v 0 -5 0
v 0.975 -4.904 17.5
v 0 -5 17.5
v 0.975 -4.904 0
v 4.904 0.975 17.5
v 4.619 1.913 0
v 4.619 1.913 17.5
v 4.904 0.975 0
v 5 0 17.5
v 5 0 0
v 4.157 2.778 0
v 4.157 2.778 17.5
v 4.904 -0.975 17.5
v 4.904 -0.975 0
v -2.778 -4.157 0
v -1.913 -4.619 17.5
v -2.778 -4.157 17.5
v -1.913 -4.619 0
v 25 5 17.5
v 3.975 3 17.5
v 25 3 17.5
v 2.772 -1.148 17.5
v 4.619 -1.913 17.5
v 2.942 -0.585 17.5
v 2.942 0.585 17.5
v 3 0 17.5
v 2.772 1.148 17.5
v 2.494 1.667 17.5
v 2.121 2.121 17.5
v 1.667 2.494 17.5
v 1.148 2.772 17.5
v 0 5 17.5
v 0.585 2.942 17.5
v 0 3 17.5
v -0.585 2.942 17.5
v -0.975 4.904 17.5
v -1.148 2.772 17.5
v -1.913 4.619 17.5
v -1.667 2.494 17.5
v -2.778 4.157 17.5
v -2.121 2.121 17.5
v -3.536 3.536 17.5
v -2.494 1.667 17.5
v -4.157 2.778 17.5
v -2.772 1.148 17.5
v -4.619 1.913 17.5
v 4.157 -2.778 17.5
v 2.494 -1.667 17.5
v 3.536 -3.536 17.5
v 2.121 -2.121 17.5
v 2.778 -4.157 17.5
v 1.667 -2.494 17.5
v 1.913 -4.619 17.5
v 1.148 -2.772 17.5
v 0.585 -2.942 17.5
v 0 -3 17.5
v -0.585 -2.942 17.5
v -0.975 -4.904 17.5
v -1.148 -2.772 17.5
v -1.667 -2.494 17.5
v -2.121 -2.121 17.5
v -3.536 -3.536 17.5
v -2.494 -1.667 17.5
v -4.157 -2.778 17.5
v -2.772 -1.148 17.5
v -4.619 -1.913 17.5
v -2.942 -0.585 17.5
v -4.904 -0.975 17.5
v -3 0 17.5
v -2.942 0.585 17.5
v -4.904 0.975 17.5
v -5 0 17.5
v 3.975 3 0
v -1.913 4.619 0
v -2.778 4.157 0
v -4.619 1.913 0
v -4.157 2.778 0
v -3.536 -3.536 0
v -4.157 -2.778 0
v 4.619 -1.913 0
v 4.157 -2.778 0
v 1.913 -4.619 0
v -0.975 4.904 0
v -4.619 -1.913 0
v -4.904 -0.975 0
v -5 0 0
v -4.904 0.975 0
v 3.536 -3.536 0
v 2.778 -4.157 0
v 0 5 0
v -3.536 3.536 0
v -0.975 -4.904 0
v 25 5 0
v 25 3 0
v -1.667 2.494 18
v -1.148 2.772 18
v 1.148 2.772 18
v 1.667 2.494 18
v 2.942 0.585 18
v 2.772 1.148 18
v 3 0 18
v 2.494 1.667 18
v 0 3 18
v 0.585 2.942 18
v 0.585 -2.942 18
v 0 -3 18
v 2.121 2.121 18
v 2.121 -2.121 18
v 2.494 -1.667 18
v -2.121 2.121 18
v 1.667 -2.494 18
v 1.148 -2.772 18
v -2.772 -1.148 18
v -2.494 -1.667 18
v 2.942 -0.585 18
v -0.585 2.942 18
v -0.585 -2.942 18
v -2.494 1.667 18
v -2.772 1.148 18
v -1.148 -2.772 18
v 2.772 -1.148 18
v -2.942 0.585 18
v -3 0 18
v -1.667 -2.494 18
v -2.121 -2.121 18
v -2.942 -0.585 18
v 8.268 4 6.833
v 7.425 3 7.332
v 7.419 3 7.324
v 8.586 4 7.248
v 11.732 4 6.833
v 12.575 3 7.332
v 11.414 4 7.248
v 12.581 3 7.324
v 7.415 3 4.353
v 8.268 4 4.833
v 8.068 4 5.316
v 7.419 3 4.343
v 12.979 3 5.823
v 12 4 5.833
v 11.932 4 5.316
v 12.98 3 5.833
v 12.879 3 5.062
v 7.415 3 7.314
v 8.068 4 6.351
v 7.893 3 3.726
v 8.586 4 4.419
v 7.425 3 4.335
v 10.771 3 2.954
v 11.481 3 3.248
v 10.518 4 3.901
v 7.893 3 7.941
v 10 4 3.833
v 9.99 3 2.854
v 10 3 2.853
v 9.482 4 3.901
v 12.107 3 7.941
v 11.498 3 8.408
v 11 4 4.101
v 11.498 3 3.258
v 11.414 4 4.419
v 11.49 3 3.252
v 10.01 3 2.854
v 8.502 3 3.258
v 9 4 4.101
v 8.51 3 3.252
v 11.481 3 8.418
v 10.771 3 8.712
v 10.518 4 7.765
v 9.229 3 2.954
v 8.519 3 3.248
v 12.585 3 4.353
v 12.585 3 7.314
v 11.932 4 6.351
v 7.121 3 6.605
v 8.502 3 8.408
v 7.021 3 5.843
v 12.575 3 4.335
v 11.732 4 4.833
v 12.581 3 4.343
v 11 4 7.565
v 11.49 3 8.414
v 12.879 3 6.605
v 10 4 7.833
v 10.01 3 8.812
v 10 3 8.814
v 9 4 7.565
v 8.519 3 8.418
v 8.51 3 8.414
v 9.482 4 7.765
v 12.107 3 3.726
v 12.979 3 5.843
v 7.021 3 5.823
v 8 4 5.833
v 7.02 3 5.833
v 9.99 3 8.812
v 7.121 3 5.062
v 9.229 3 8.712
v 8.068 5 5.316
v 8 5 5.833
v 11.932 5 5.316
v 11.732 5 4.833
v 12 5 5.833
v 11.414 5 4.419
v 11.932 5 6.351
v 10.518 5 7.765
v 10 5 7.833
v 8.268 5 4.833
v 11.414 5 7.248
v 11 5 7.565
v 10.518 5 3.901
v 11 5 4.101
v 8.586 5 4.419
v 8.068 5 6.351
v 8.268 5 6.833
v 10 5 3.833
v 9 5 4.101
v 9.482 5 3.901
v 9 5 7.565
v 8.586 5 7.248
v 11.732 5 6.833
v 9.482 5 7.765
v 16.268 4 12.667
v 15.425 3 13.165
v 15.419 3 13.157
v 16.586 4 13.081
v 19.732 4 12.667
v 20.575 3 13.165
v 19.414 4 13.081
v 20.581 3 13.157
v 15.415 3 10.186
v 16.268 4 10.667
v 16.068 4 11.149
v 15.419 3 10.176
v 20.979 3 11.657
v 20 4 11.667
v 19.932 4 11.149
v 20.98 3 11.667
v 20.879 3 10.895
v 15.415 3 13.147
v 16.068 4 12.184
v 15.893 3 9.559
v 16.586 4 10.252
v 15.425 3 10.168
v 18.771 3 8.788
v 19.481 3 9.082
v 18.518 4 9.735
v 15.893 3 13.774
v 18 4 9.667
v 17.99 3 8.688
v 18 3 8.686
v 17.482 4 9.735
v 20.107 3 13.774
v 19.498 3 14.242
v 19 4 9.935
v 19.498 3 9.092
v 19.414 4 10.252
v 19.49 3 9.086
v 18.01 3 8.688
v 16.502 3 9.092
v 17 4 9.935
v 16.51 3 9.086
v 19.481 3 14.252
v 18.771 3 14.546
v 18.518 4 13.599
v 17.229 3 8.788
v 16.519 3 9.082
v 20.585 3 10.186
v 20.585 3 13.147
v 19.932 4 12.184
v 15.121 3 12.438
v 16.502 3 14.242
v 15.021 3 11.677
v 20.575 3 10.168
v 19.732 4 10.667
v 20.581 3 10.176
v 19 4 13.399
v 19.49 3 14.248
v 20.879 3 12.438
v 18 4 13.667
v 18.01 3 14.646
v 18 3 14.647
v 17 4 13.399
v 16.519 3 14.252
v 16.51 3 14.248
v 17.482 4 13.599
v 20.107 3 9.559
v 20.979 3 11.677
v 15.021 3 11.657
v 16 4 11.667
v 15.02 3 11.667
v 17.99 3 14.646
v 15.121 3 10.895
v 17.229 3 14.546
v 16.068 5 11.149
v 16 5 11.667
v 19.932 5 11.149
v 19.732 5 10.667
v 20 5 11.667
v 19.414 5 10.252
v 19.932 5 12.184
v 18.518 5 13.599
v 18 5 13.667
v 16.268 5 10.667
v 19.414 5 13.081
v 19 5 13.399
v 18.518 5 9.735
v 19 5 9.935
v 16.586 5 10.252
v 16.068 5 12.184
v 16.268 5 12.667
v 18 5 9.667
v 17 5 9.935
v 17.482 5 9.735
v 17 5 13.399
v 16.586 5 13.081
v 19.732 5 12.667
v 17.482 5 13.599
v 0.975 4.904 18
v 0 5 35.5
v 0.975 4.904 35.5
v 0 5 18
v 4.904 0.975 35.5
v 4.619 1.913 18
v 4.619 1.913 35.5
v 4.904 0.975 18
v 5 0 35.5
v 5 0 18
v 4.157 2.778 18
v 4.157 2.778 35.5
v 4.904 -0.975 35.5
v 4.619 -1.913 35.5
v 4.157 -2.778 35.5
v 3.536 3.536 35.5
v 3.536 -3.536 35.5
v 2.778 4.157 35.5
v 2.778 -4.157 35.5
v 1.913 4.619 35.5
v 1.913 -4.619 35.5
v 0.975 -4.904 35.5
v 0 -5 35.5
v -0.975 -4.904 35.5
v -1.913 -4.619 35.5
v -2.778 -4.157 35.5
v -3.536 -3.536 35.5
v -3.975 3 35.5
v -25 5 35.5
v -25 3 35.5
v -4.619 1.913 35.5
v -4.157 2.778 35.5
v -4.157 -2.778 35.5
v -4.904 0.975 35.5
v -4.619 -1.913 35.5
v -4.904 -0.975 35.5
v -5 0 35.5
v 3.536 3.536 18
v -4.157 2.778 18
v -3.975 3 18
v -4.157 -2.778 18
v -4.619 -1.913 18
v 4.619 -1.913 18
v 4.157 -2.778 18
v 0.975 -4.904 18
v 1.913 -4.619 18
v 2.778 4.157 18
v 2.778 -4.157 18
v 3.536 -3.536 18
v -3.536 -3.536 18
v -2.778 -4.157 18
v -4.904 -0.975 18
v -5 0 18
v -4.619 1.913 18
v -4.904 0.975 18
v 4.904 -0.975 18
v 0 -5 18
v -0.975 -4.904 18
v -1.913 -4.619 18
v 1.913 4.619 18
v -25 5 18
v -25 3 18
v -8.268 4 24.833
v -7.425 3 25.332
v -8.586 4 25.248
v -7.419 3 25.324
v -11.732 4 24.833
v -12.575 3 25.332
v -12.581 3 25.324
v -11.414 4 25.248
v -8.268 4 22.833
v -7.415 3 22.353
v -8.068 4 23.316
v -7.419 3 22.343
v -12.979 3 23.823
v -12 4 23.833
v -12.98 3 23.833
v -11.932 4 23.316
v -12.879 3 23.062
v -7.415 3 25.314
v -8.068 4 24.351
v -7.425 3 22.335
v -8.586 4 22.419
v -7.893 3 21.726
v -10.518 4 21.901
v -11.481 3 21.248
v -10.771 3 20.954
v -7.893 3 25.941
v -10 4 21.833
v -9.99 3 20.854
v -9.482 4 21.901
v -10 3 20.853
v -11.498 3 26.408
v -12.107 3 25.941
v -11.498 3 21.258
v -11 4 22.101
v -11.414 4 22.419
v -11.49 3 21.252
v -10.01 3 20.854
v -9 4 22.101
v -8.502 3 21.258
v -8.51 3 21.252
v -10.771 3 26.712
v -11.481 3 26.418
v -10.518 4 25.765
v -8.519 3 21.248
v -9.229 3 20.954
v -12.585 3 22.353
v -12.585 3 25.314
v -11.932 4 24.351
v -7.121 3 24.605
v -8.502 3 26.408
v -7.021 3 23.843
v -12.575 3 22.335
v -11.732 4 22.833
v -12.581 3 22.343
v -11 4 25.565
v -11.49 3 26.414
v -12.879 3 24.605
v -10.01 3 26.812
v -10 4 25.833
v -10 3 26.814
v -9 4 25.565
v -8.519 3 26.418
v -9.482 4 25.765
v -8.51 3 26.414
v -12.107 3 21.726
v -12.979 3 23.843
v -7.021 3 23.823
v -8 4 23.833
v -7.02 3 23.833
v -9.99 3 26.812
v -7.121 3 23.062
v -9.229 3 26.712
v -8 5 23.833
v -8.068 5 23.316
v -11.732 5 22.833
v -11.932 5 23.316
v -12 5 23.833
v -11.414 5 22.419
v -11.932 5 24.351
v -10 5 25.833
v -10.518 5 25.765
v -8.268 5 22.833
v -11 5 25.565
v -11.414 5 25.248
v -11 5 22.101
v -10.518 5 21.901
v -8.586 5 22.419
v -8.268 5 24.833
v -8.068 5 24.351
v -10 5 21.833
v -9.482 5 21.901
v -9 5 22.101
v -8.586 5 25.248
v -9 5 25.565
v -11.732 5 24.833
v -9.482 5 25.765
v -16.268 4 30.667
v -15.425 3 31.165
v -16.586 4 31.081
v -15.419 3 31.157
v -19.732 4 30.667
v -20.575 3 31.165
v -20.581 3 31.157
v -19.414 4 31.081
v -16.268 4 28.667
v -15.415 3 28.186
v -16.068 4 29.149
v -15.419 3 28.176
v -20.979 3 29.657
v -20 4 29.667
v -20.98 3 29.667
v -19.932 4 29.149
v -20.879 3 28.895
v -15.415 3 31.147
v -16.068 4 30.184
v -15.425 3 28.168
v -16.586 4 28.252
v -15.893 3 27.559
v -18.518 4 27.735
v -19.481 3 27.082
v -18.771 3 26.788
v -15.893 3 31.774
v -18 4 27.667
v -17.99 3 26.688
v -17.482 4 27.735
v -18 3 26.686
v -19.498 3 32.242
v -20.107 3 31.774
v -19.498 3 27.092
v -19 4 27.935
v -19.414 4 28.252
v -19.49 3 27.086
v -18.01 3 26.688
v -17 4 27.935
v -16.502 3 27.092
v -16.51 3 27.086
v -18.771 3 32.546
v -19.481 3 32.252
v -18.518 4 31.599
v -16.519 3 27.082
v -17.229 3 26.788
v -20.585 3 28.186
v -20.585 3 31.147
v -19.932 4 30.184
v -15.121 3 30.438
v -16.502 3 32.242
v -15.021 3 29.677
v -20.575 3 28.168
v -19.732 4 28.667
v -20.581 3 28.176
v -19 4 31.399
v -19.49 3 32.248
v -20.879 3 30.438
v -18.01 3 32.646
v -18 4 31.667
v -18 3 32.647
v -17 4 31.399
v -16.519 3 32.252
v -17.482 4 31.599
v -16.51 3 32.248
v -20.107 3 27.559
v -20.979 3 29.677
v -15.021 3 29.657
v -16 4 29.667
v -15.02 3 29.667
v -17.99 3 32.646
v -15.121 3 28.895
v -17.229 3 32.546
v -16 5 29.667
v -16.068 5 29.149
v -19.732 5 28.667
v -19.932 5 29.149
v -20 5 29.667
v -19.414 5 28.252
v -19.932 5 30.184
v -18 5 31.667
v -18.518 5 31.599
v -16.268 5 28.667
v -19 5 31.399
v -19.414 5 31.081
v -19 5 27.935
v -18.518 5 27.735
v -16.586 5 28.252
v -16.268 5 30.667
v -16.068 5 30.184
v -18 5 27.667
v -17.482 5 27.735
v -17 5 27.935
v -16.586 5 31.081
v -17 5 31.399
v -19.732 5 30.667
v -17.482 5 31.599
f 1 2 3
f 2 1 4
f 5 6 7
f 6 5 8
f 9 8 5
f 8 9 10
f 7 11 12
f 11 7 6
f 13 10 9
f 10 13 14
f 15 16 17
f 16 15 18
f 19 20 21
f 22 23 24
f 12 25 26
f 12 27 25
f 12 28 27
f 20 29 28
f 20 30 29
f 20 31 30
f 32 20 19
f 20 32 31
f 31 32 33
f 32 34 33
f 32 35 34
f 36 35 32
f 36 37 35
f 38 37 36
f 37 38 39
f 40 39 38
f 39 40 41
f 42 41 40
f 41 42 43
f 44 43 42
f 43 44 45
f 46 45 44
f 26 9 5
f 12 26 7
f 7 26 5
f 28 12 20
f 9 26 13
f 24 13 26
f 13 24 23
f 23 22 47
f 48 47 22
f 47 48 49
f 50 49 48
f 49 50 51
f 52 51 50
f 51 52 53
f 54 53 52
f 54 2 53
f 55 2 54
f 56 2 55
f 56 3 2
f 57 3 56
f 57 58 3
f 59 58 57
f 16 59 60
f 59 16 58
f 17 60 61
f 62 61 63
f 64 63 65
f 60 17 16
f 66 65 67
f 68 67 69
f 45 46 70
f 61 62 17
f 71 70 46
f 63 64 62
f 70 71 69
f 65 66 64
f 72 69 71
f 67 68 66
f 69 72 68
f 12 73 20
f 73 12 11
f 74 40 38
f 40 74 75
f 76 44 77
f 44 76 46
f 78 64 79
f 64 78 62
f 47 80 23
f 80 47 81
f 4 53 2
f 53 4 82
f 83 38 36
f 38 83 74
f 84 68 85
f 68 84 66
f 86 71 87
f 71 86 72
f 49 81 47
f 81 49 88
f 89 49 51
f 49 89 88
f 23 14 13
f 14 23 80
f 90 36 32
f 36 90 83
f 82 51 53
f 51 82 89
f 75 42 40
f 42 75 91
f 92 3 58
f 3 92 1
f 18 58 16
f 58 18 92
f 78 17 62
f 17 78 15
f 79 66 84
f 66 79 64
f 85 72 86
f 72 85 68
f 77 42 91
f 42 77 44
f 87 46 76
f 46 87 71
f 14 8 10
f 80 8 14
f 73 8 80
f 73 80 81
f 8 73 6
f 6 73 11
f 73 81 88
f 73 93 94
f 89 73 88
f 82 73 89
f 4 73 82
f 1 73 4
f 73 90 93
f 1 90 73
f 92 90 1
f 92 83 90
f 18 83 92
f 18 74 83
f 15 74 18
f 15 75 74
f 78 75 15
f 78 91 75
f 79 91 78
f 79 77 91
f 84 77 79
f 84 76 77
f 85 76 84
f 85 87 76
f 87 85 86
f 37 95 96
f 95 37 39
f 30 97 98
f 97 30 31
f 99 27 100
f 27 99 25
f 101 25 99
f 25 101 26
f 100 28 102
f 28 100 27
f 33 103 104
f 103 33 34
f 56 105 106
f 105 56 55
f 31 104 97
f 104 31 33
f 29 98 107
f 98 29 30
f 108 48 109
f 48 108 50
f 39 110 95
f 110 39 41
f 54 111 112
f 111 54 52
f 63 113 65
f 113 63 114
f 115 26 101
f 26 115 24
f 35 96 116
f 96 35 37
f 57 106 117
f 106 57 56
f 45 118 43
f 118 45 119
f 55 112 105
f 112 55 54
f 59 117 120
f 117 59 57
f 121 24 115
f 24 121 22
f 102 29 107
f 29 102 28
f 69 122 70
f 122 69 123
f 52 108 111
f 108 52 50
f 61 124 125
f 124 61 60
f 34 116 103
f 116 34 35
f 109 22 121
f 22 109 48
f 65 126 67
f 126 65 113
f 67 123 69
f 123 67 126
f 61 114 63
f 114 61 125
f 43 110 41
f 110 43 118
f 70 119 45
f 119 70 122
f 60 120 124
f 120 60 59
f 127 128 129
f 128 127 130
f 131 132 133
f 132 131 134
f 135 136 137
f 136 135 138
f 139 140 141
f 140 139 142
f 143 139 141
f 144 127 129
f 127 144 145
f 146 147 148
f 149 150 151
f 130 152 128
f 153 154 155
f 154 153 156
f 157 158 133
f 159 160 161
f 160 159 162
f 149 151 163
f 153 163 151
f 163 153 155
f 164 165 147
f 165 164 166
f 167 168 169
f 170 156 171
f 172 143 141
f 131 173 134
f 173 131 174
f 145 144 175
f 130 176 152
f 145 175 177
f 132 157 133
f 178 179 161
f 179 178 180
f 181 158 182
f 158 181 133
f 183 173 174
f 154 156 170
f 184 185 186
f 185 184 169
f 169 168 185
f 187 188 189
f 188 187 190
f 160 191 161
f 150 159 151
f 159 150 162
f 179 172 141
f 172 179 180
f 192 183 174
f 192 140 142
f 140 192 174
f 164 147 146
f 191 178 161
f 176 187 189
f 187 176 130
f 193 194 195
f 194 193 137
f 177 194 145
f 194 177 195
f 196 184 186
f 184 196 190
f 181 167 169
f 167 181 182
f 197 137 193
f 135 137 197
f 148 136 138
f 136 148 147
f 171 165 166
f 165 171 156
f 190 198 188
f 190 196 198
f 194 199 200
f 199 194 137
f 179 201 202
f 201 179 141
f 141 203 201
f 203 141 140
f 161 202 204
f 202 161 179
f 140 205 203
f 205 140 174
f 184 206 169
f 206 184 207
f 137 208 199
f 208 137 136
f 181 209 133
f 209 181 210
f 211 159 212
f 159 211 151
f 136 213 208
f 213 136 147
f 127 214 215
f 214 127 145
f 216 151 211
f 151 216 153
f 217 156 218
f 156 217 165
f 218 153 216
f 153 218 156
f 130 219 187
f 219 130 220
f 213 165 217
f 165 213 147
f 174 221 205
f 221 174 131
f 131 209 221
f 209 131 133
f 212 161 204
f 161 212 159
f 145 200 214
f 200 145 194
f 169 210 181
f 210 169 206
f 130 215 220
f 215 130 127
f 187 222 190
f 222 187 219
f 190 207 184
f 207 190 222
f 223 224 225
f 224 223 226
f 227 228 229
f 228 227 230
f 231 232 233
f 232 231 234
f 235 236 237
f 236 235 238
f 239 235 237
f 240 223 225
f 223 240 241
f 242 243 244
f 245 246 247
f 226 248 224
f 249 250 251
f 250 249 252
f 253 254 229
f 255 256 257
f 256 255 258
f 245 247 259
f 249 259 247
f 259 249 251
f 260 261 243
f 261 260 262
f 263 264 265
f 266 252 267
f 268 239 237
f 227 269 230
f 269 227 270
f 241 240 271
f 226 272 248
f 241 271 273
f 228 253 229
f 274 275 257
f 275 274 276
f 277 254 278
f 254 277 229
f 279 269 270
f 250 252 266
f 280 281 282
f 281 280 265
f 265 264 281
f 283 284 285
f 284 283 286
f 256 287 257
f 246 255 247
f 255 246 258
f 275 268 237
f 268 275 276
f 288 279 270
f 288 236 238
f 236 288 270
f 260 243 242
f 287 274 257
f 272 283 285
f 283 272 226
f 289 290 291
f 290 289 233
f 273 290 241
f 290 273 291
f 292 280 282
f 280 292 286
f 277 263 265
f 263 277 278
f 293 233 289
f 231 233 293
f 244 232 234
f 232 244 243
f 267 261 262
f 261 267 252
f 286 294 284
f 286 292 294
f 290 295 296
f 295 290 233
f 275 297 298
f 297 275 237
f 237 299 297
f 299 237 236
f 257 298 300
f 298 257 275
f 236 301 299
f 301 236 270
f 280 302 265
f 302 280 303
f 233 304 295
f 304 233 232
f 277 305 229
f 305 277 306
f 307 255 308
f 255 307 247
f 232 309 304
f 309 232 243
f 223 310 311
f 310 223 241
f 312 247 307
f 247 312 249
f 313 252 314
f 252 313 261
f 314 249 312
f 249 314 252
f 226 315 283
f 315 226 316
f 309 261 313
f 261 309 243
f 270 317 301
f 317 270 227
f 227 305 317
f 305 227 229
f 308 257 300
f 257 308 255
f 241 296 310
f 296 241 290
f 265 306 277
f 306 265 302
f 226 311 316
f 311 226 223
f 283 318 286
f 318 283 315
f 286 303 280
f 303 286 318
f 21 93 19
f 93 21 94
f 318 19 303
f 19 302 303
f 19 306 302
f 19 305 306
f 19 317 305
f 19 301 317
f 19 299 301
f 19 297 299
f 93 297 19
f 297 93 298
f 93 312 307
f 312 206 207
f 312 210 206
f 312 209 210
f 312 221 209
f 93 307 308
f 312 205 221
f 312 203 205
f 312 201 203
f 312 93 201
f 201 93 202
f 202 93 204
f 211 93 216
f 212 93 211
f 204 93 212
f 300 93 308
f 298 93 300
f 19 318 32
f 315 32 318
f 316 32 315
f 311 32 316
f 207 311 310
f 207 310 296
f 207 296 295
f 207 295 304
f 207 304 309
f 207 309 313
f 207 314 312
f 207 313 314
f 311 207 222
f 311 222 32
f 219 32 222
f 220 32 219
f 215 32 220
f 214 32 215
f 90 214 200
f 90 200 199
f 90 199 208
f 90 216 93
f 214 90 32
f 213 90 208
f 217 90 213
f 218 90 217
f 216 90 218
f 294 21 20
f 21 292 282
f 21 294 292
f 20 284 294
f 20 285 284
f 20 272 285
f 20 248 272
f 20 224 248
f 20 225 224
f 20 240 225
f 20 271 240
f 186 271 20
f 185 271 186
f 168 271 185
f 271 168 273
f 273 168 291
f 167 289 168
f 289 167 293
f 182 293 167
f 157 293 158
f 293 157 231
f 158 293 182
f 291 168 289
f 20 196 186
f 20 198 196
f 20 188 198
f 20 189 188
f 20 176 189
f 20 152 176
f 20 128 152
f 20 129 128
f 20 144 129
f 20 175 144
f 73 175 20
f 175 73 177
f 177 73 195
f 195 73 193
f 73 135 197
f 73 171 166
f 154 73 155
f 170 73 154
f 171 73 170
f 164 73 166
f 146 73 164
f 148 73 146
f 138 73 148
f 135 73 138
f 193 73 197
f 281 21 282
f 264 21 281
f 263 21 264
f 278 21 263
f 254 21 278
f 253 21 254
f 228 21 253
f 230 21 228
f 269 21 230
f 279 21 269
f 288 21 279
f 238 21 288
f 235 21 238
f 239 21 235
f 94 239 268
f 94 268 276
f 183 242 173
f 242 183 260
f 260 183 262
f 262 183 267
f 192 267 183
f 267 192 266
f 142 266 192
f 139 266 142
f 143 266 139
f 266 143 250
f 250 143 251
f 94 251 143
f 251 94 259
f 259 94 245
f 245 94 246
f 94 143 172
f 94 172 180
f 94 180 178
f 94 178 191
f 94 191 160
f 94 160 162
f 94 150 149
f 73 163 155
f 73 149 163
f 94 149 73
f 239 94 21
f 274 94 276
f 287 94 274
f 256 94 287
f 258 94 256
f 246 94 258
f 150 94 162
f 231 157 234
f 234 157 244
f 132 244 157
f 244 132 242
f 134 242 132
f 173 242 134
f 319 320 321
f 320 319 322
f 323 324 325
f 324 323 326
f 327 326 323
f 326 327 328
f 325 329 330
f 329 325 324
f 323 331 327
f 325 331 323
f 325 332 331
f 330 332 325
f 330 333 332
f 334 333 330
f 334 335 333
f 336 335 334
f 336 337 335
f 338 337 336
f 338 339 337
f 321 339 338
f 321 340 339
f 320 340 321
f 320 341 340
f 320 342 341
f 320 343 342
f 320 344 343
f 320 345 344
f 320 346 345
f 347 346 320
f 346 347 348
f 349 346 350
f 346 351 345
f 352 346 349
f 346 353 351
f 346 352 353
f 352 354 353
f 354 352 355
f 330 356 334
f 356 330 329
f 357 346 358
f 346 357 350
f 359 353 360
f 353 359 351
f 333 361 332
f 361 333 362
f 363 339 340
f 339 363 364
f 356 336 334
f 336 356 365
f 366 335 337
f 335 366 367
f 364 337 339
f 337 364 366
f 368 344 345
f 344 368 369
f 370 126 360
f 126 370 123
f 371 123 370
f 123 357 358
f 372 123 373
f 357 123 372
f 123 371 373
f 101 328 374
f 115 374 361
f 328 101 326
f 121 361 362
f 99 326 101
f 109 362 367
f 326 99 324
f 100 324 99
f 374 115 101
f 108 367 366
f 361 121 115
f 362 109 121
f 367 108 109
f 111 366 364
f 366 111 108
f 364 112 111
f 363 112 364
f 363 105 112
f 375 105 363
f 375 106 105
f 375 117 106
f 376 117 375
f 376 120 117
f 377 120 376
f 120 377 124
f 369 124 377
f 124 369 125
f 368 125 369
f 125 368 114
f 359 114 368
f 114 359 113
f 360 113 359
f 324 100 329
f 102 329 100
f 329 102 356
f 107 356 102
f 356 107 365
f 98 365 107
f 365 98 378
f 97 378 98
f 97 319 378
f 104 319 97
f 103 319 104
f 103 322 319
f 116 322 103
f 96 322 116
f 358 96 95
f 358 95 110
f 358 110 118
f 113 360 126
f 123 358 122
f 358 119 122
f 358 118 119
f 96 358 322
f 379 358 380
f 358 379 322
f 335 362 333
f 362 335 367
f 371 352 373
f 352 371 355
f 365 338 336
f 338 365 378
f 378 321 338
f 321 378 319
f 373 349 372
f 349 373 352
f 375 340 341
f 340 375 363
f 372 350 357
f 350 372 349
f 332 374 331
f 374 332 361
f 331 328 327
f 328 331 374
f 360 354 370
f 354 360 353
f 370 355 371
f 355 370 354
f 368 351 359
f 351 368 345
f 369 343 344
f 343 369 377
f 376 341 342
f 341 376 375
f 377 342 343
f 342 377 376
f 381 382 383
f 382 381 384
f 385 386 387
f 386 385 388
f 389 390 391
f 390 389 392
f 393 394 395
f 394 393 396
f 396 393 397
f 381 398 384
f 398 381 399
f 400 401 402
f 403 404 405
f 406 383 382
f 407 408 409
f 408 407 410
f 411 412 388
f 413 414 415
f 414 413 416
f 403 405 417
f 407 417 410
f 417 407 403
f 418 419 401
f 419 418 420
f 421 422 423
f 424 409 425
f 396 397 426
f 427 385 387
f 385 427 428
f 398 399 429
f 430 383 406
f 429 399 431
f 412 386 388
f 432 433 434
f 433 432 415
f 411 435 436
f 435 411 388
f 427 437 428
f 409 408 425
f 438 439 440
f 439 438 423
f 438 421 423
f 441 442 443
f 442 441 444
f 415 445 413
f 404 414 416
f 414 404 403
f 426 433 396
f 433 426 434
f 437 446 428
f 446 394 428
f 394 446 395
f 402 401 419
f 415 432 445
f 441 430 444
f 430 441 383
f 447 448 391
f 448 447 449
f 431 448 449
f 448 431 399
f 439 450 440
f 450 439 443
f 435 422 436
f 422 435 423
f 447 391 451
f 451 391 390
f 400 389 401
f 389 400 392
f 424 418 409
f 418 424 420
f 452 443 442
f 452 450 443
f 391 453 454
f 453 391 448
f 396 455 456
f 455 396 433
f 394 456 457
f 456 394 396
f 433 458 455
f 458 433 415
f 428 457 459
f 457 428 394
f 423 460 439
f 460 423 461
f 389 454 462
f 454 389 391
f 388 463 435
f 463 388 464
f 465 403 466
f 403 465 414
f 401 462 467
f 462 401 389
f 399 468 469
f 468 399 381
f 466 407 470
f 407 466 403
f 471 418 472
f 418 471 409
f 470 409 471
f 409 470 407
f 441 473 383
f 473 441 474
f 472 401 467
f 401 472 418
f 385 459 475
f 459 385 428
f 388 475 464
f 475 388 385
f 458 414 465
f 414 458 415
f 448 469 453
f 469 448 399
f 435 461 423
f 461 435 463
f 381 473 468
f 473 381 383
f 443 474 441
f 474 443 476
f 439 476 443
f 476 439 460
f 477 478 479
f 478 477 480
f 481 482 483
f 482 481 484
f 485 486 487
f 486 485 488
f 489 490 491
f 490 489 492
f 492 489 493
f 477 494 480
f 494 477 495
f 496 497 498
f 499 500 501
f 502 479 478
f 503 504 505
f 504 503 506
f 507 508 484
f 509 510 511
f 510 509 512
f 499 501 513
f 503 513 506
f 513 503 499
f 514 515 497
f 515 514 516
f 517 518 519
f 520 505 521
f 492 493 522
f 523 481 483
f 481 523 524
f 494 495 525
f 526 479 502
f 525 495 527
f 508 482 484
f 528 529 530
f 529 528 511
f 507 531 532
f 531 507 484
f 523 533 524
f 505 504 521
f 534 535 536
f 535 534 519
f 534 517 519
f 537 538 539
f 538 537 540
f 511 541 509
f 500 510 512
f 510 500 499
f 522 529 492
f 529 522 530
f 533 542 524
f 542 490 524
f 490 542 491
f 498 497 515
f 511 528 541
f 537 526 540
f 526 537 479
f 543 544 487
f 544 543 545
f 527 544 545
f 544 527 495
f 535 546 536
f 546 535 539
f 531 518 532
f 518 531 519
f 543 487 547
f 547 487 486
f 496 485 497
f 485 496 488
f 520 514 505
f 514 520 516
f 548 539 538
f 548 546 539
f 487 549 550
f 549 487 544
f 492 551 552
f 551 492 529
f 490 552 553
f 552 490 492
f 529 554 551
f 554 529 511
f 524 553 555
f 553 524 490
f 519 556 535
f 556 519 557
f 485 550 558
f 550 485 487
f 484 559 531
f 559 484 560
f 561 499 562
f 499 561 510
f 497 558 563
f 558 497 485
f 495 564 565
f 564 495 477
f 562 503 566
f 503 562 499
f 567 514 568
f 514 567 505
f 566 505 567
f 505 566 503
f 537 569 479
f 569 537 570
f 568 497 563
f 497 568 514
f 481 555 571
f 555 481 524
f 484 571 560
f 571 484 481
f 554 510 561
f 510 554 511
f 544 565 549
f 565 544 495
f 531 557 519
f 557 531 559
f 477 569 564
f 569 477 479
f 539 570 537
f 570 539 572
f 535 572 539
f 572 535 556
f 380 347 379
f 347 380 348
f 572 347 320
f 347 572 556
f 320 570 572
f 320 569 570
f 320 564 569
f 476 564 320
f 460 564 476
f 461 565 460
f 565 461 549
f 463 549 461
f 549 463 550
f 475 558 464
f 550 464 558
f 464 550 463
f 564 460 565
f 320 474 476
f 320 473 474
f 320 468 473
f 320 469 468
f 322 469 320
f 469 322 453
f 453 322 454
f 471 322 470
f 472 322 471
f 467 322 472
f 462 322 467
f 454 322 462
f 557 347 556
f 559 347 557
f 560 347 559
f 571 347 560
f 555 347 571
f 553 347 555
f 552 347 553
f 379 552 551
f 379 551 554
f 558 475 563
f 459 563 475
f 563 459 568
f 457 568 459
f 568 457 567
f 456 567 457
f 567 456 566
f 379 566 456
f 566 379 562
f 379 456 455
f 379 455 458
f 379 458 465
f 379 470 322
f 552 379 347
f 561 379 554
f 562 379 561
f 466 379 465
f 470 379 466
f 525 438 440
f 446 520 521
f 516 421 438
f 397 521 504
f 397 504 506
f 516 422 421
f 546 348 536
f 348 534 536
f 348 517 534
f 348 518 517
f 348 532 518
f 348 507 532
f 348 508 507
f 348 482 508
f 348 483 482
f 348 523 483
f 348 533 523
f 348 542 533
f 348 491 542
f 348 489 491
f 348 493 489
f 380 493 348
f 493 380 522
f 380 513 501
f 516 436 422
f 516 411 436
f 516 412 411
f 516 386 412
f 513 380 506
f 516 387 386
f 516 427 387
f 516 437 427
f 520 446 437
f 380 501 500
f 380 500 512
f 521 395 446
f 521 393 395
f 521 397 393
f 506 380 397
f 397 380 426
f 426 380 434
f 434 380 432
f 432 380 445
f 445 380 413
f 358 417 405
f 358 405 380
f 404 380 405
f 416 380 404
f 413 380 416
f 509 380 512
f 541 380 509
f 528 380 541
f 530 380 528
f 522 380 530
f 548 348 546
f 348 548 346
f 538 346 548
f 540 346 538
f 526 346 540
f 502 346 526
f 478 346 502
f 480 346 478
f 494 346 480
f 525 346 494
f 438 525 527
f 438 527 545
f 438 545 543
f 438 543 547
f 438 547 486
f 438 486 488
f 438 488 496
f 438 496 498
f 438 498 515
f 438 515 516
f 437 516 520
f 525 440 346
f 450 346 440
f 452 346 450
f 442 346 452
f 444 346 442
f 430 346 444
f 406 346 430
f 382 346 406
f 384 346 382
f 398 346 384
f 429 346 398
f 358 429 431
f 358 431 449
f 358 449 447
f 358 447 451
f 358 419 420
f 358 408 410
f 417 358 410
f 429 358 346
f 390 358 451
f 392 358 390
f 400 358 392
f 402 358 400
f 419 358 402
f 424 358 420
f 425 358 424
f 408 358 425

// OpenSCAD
$fn=32;

outerDiameter=5;
wallThickness=2;
innerDiameter = outerDiameter - wallThickness;
mountLength=25;
height=35;

zFightFix=0.01;

module screwHole(screwDiameter, headDiameter, headHeight, shaftLength=4) {
    union() {
      translate([0, 0, -0.01]) cylinder(r2 = screwDiameter/2, r1 = headDiameter/2, h = headHeight+0.02, $fn=24);
      translate([0, 0, headHeight]) cylinder(r1 = screwDiameter/2, r2 = screwDiameter/2, h = shaftLength, $fn=24);
    }
}

module mount() {
  mountHeight = height / 2;
    translate([0, outerDiameter-wallThickness, 0])
      difference() {
        cube([mountLength, wallThickness, mountHeight]);
        translate([10, -zFightFix, mountHeight/3]) rotate([-90, 0, 0]) screwHole(4, 6, 1);
        translate([18, -zFightFix, mountHeight/3*2]) rotate([-90, 0, 0]) screwHole(4, 6, 1);

      }
}

module male() {
  union() {
    cylinder(r1 = outerDiameter, r2 = outerDiameter, h = height/2);
    translate([0, 0, height/2]) cylinder(r1 = innerDiameter, r2 = innerDiameter, h = height/2);
  };
  mount();
}

module female() {
  difference() {
    cylinder(r1 = outerDiameter, r2 = outerDiameter, h = height/2);
    translate([0, 0, -zFightFix]) cylinder(r1 = innerDiameter, r2 = innerDiameter, h = height/2 - wallThickness);
  }
  mirror([1, 0, 0]) mount();
}

male();
translate([0, 0, 0.5 * height + 0.5]) female();
